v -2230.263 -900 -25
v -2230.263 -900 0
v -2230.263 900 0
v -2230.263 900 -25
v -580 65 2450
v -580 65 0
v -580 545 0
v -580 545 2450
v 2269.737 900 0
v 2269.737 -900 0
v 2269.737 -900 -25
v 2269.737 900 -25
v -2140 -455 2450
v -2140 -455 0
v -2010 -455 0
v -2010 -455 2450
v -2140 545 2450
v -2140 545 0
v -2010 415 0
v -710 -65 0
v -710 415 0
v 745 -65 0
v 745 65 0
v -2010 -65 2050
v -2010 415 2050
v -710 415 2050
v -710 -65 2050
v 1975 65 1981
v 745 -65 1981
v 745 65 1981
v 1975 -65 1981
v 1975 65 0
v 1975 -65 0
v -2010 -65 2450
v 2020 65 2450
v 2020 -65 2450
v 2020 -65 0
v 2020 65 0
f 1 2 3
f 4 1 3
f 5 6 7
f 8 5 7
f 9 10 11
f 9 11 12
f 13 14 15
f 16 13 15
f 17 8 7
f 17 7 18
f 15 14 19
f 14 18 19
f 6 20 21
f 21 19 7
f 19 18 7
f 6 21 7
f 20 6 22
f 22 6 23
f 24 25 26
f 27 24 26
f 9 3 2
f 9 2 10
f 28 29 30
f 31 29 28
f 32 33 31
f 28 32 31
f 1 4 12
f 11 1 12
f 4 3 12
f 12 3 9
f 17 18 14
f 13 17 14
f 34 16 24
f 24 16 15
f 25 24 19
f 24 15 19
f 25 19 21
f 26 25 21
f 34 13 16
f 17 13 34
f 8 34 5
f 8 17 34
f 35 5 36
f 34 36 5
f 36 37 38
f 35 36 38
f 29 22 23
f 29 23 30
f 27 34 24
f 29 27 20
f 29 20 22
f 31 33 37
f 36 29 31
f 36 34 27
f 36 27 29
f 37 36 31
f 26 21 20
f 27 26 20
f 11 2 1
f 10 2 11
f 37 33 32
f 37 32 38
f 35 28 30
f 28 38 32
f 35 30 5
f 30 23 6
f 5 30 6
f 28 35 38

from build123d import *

# Parameters (mm, degrees)
F0_W     = 130
F0_H     = 350
F0_W_2   = 1310
F0_H_2   = 130
F1_DEPTH = 2450
F2_W     = 1300
F2_H     = 480
F3_DEPTH = 400
F4_W     = 1230
F4_H     = 1981
F5_DEPTH = 610.001
F6_W     = 4500
F6_H     = 1800
F7_DEPTH = 25


with BuildPart() as f1:
    # F0 (on Top) → F1 (new body)
    with BuildSketch(Plane.XY):
        Polygon((-2010, -455), (-2010, 415), (-2010, 545), (-2140, 545), (-2140, -455), align=None)
        Polygon((-2010, 415), (-710, 415), (-580, 415), (-580, 545), (-2010, 545), align=None)
        with Locations((-645, 240)):
            Rectangle(F0_W, F0_H)
        Polygon((-710, -65), (710, -65), (710, 65), (-580, 65), (-710, 65), align=None)
        with Locations((1365, 0)):
            Rectangle(F0_W_2, F0_H_2)
    extrude(amount=F1_DEPTH)

    # F2 (on face) → F3 (join)
    with BuildSketch(Plane.XY.offset(2450)):
        with Locations((-1360, 175)):
            Rectangle(F2_W, F2_H)
    extrude(amount=-F3_DEPTH)

    # F4 (on face) → F5 (cut, through all)
    with BuildSketch(Plane.XZ.offset(65)):
        with Locations((1360, 990.5)):
            Rectangle(F4_W, F4_H)
    extrude(amount=-F5_DEPTH, mode=Mode.SUBTRACT)


with BuildPart() as f7:
    # F6 (on Top) → F7 (new body)
    with BuildSketch(Plane.XY):
        with Locations((19.737083, 0)):
            Rectangle(F6_W, F6_H)
    extrude(amount=-F7_DEPTH)


solid = Compound([f1.part, f7.part])
